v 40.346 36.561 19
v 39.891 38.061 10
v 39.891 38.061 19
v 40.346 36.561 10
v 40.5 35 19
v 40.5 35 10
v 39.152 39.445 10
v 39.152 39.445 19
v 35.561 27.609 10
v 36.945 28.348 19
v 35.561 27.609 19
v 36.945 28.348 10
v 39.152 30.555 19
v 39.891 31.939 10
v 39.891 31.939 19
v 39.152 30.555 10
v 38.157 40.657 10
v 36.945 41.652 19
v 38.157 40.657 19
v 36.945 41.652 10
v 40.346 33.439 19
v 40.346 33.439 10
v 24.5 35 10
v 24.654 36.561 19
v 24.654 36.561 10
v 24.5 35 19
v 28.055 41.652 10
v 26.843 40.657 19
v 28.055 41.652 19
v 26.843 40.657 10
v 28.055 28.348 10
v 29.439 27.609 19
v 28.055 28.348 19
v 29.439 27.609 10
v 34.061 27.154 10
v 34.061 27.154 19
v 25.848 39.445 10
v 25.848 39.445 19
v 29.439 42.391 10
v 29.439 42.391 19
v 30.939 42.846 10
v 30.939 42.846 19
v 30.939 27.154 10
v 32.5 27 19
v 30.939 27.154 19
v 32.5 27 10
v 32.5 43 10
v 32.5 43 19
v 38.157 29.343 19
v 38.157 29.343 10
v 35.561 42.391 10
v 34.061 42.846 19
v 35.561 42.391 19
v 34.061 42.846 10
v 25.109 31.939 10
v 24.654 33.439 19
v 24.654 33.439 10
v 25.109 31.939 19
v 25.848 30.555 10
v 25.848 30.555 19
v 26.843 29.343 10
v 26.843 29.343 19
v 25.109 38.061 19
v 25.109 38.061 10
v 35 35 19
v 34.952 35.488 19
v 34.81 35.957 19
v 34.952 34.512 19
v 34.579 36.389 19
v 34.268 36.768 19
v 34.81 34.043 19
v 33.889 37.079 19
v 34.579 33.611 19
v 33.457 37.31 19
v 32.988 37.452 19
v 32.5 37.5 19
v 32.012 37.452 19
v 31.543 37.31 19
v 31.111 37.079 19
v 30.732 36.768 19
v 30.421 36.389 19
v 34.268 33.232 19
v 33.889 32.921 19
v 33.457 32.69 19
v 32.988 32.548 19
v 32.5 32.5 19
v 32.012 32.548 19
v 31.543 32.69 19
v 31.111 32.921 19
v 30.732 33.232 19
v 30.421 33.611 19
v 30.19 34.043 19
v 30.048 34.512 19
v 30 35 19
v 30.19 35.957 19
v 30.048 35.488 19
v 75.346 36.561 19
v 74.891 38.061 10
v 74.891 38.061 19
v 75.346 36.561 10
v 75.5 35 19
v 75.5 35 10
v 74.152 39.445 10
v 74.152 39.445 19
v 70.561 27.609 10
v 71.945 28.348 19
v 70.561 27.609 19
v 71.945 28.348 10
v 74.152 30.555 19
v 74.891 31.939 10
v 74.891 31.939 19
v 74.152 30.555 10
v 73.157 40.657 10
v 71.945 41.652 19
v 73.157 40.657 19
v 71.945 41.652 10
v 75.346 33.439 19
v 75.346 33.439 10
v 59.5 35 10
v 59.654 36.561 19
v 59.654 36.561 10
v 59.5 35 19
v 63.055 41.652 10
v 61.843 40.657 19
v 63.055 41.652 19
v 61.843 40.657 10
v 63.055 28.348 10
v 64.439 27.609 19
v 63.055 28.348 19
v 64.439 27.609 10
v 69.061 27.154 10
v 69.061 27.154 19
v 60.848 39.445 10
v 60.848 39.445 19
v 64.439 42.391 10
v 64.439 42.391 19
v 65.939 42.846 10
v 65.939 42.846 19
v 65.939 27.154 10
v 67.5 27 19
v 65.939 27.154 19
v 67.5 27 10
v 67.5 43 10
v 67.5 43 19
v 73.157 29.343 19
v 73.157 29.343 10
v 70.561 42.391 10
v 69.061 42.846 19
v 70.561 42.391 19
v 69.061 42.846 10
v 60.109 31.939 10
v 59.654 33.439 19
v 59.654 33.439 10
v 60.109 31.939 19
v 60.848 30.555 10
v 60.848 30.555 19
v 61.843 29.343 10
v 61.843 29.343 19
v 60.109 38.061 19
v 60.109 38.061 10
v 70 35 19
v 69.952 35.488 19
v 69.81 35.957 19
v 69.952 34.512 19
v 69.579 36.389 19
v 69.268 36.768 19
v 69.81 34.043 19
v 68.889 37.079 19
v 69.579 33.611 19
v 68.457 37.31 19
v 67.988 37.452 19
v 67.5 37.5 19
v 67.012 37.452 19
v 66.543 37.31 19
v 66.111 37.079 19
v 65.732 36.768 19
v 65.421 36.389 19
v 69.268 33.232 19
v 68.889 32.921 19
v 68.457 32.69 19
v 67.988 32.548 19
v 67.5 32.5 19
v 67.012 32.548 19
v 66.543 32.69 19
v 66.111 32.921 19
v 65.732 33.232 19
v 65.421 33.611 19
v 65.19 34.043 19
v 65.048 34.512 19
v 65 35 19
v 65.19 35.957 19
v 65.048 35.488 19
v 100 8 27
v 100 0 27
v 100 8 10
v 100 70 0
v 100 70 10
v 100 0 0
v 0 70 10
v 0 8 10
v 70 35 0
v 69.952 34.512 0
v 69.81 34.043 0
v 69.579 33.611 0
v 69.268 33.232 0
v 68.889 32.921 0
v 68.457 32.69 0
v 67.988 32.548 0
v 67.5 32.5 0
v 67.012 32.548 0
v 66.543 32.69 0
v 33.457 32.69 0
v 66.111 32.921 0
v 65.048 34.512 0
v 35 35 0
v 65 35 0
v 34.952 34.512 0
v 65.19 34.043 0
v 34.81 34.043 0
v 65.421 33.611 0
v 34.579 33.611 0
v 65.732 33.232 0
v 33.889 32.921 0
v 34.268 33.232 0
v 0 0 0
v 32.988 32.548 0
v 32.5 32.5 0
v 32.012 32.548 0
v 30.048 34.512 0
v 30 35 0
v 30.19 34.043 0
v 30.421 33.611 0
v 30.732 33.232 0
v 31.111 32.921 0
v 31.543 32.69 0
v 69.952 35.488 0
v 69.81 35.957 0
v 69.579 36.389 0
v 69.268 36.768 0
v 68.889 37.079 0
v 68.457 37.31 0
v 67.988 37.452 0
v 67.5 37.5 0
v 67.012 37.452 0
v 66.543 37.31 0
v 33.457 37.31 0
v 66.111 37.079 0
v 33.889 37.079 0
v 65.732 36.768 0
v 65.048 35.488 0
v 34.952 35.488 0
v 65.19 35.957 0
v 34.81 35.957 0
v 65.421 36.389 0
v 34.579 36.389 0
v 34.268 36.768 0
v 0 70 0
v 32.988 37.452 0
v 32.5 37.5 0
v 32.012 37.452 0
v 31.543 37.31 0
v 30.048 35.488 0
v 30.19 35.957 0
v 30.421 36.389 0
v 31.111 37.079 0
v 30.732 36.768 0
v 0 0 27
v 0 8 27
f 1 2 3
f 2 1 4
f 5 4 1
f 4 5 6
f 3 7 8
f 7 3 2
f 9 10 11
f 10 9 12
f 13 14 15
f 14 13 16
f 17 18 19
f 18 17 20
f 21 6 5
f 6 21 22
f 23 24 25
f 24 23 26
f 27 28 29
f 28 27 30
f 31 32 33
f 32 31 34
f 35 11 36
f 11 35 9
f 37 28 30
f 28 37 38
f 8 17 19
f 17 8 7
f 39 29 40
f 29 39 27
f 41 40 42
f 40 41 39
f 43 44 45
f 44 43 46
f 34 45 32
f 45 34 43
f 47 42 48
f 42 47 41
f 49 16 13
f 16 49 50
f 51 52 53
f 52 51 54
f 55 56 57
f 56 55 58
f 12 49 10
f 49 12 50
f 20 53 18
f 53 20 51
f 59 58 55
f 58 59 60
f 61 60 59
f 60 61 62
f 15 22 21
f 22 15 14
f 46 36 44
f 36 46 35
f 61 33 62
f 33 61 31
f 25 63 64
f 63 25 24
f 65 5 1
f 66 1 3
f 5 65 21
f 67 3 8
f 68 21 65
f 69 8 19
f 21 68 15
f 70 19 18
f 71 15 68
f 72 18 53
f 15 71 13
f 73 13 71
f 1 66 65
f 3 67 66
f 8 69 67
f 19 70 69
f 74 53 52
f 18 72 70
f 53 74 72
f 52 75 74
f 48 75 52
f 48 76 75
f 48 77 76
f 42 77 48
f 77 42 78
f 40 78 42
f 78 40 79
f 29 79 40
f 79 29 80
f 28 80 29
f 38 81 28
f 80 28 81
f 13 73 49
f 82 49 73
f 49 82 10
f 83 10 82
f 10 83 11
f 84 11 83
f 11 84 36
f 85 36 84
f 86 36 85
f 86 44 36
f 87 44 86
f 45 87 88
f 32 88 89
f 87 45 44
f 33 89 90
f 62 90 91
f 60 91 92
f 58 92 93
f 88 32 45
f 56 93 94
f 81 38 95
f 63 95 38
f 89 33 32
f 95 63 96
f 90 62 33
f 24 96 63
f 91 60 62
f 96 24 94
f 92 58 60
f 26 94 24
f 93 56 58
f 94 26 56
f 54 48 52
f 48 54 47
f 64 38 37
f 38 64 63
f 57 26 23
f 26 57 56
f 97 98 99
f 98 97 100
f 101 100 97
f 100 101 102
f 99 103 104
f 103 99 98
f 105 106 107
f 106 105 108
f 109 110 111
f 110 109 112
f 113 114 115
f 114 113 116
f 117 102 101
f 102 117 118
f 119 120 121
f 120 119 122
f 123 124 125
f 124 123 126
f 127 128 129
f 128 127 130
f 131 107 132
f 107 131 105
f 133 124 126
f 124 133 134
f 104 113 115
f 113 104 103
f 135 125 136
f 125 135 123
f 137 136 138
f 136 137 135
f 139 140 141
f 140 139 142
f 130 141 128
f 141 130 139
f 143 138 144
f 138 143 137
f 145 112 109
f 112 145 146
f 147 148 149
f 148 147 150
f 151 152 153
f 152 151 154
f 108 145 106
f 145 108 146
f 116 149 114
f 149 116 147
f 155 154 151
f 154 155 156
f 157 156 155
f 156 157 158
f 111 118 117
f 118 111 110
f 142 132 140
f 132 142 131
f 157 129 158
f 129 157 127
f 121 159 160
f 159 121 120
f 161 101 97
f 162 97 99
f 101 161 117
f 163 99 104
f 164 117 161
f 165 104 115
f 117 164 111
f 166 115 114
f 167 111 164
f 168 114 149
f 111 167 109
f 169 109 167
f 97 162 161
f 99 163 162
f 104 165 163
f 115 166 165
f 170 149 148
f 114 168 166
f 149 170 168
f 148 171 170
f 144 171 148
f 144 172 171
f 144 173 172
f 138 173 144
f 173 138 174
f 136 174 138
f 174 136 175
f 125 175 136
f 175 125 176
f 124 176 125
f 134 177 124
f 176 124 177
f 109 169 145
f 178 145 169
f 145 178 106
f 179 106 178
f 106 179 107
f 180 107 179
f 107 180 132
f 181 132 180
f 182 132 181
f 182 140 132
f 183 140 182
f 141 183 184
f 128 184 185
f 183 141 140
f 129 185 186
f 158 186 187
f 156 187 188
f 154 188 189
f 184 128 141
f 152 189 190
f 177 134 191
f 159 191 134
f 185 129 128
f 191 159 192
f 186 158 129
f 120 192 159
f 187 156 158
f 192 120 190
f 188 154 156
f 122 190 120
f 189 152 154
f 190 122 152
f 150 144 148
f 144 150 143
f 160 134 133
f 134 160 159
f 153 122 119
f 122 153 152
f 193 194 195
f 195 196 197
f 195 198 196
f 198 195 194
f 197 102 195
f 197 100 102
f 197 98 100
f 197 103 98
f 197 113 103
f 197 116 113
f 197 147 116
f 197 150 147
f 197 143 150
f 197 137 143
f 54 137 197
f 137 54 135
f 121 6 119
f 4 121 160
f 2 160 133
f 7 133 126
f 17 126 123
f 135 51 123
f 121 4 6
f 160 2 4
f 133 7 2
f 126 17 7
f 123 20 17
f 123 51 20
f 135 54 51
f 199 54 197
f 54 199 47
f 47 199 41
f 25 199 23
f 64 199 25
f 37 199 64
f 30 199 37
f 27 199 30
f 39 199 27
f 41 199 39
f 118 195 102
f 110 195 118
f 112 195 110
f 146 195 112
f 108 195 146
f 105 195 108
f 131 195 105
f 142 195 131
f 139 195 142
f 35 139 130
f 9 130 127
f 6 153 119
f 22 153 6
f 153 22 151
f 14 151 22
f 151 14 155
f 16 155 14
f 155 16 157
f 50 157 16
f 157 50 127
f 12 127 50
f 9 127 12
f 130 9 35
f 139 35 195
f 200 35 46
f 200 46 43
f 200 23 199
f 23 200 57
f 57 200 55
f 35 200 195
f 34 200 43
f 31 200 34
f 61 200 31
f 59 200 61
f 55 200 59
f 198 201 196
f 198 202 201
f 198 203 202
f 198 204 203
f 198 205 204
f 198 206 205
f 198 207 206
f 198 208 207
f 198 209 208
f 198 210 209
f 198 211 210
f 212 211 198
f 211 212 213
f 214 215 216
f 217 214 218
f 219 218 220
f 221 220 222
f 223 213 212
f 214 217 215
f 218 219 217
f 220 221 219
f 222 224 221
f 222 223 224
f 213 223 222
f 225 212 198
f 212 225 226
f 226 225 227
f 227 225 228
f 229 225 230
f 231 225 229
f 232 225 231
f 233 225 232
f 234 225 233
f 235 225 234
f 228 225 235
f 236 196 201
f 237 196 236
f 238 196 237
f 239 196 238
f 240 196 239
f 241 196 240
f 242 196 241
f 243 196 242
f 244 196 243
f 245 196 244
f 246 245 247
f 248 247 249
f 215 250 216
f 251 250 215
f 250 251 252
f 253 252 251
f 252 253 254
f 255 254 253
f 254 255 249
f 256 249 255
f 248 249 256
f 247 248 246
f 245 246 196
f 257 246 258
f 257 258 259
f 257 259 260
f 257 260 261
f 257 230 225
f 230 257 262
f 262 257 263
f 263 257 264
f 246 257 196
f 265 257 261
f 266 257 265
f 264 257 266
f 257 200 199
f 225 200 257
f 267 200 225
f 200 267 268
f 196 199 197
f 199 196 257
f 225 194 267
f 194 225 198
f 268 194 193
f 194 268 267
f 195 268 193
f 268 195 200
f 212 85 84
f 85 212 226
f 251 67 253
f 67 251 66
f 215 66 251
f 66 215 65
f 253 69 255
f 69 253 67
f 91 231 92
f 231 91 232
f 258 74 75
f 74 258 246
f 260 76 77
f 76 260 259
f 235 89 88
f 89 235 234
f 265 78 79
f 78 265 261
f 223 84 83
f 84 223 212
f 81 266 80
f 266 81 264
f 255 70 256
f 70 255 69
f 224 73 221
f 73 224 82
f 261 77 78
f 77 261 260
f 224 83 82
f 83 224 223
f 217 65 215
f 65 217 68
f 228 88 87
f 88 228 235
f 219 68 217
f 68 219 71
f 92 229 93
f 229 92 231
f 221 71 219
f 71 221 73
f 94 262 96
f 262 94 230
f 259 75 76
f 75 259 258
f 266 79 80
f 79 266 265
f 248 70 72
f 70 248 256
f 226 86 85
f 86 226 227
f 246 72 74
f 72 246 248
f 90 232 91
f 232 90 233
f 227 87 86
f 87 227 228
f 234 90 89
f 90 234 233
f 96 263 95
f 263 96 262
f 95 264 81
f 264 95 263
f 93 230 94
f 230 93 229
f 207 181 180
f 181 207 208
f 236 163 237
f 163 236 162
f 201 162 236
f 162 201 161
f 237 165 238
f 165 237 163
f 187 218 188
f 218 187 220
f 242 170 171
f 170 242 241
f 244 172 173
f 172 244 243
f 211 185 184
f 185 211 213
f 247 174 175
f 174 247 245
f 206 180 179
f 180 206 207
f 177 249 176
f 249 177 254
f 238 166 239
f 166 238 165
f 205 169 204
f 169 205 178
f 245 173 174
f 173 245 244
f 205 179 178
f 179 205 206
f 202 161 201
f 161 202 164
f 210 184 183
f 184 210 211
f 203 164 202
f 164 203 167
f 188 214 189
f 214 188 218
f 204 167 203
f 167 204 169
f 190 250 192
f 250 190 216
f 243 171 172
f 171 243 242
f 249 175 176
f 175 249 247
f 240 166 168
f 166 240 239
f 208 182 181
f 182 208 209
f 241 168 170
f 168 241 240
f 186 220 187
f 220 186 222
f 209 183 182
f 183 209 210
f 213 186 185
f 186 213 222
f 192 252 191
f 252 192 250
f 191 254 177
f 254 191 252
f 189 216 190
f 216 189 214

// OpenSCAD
$fn = 32;

// ----------------------------------------------------------------------
// Drill jig: fence jig
// ----------------------------------------------------------------------

// --- parameters (mm) ---
plate_l = 100;            // plate length, X
plate_w = 70;             // plate width, Y
plate_t = 10;             // plate thickness
boss_d = 16;              // guide boss diameter
boss_h = 10;              // boss height above the plate
guide_d = 5;              // guide hole diameter
boss_pitch = 35;          // boss pitch
fence_h = 18;             // fence height above the plate
fence_t = 8;              // fence thickness

n_boss = 2;  // guide bosses
boss_x0 = (plate_l - (n_boss - 1) * boss_pitch) / 2;  // first boss X
boss_top = plate_t - 1 + boss_h;  // boss crown height
fence_top = plate_t - 1 + fence_h;  // fence crown height
total_h = max([fence_top, boss_top]);  // overall height

difference() {
  union() {
  cube([plate_l, plate_w, plate_t]);
  for (i = [0 : n_boss - 1])
    translate([boss_x0 + i * boss_pitch, plate_w / 2, plate_t - 1])
      cylinder(h = boss_h, d = boss_d);
  translate([0, 0, plate_t - 1]) cube([plate_l, fence_t, fence_h]);
  }
  for (i = [0 : n_boss - 1])
    translate([boss_x0 + i * boss_pitch, plate_w / 2, -1])
      cylinder(h = plate_t + boss_h, d = guide_d);
}
